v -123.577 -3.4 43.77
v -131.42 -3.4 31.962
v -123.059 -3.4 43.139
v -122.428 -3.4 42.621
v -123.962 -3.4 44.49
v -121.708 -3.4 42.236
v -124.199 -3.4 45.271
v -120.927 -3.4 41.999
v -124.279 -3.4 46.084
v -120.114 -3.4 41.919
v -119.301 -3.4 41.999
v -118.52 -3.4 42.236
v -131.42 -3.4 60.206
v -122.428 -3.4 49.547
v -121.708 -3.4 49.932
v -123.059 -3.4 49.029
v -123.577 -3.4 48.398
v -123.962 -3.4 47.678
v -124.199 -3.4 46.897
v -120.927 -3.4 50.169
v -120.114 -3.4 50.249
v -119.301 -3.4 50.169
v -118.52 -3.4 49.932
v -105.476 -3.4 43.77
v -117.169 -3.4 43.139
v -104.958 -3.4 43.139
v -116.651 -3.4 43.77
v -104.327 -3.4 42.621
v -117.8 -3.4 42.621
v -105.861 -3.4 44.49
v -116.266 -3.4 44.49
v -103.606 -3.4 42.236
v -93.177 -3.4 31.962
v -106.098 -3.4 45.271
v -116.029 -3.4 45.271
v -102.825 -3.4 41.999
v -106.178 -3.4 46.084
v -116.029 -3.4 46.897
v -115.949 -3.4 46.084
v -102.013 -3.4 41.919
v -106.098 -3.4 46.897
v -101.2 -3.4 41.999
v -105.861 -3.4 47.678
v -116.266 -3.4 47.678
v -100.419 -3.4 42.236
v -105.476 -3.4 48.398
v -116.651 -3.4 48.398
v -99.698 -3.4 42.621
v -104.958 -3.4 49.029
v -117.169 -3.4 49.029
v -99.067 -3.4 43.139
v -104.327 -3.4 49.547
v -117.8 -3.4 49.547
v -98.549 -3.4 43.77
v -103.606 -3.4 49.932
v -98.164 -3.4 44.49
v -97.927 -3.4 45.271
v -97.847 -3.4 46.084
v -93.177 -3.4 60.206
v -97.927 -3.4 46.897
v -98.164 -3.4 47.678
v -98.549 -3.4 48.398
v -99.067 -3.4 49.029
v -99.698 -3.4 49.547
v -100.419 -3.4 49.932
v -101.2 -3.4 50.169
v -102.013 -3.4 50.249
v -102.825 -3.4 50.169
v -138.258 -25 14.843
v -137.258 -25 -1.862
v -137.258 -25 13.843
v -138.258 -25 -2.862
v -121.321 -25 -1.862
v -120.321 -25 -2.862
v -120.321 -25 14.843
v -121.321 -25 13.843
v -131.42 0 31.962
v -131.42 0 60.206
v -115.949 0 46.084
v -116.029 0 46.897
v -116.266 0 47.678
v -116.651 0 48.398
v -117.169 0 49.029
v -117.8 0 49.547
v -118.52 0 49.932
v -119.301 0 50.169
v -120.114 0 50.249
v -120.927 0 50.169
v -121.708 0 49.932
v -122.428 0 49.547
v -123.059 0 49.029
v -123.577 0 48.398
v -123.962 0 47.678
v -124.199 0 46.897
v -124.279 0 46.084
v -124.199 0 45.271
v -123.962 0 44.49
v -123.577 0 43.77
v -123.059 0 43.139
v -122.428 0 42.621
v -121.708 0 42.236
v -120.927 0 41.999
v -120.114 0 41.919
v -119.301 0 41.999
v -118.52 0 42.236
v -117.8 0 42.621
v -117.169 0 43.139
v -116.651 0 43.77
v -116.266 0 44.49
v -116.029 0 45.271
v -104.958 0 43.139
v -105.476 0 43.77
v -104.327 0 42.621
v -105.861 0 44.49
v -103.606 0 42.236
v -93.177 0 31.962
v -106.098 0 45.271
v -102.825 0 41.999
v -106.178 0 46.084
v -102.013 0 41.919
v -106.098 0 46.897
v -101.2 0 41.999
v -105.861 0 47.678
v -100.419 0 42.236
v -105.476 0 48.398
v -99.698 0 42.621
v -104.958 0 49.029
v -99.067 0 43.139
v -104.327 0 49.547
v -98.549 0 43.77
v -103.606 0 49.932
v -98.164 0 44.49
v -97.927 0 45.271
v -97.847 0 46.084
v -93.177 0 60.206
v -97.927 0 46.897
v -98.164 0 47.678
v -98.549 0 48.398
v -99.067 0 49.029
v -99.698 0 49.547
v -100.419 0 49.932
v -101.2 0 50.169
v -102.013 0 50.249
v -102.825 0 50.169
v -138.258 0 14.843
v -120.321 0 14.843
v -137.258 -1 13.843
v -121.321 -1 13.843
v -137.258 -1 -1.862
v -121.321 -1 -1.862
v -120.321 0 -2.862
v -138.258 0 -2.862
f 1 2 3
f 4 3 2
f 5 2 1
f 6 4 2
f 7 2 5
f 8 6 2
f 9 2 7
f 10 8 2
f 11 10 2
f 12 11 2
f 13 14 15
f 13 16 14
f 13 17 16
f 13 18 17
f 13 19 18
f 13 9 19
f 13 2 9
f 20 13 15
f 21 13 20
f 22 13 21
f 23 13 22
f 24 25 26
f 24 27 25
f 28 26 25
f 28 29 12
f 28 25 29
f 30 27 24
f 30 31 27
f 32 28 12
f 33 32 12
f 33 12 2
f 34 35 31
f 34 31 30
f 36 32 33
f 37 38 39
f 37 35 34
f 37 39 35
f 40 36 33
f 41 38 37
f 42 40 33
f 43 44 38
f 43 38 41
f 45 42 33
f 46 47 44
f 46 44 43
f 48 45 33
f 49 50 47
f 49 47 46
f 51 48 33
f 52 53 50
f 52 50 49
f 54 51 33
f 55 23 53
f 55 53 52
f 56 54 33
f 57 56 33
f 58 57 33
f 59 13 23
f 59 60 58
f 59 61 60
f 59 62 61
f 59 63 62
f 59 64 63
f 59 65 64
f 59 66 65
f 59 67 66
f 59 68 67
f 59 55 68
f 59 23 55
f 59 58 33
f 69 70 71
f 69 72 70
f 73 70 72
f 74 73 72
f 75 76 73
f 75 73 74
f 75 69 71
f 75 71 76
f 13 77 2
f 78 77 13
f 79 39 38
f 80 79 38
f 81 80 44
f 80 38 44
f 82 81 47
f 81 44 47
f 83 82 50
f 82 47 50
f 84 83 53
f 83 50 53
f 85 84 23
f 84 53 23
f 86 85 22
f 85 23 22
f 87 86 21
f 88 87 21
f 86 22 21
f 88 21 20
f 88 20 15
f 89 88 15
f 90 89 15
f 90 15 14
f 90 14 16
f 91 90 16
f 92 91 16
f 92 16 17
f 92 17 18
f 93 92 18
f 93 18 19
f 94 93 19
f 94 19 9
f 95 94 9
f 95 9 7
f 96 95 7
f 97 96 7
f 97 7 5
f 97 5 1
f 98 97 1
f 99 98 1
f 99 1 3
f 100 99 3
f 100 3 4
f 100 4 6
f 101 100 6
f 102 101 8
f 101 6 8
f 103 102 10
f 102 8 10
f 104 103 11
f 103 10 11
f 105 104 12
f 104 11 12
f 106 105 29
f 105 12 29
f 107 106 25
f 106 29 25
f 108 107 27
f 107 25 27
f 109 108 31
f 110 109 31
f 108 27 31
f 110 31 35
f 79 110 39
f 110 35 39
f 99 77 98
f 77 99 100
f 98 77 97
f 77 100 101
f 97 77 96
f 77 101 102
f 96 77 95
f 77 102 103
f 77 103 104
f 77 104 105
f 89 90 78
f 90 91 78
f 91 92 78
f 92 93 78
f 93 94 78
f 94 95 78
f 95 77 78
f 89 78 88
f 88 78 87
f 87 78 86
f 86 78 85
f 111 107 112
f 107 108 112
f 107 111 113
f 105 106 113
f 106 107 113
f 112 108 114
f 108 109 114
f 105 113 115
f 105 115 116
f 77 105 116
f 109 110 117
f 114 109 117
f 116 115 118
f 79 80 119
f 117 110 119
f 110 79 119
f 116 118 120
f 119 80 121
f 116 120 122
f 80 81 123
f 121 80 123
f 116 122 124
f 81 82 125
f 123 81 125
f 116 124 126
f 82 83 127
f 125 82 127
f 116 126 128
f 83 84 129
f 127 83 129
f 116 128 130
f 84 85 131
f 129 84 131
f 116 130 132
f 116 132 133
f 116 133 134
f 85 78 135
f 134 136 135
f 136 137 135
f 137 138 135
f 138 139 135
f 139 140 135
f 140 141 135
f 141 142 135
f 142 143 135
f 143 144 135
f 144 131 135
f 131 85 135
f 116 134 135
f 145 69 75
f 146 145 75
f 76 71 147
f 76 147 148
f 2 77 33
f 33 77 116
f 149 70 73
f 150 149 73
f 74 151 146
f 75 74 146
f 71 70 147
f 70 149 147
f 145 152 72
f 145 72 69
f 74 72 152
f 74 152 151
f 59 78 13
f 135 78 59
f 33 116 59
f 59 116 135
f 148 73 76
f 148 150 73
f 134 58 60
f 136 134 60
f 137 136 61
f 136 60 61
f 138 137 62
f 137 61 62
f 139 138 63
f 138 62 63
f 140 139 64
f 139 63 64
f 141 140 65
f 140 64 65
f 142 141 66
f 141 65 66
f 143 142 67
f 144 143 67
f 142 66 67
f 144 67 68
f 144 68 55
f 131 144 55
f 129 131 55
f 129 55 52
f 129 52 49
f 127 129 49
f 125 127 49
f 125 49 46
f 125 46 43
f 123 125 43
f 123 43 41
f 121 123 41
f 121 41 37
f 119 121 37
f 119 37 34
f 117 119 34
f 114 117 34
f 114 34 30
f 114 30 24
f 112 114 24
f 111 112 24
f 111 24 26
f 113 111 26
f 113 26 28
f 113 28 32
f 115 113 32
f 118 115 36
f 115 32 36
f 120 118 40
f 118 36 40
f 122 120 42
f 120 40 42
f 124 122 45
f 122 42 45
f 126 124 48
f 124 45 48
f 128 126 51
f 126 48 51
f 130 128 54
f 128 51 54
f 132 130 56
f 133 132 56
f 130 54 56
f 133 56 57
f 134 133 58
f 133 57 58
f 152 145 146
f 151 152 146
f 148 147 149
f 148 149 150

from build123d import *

# Parameters (mm, degrees)
F0_W     = 38.243354
F0_H     = 28.2434
F1_DEPTH = 3.4
F2_R     = 4.165193
F3_DEPTH = 25
F4_W     = 17.937131
F4_H     = 17.705821
F5_DEPTH = 25
F6_T     = -1


with BuildPart() as f1:
    # F0 (on Front) → F1 (new body)
    with BuildSketch(Plane.XZ):
        with Locations((-112.298593, 46.084043)):
            Rectangle(F0_W, F0_H)
    extrude(amount=F1_DEPTH)

    # F2 (on face) → F3 (cut)
    with BuildSketch(Plane.XZ.offset(3.4)):
        with Locations((-120.113924, 46.084043)):
            Circle(F2_R)
        with Locations((-102.012531, 46.084043)):
            Circle(F2_R)
    extrude(amount=-F3_DEPTH, mode=Mode.SUBTRACT)


with BuildPart() as f5:
    # F4 (on Front) → F5 (new body)
    with BuildSketch(Plane.XZ):
        with Locations((-129.289161, 5.990565)):
            Rectangle(F4_W, F4_H)
    extrude(amount=F5_DEPTH)

    # F6
    f6_openings = [f5.faces().sort_by_distance(p)[0] for p in [
        (-129.289161, -25, 5.990566),
    ]]
    offset(amount=F6_T, openings=f6_openings)


solid = Compound([f1.part, f5.part])
